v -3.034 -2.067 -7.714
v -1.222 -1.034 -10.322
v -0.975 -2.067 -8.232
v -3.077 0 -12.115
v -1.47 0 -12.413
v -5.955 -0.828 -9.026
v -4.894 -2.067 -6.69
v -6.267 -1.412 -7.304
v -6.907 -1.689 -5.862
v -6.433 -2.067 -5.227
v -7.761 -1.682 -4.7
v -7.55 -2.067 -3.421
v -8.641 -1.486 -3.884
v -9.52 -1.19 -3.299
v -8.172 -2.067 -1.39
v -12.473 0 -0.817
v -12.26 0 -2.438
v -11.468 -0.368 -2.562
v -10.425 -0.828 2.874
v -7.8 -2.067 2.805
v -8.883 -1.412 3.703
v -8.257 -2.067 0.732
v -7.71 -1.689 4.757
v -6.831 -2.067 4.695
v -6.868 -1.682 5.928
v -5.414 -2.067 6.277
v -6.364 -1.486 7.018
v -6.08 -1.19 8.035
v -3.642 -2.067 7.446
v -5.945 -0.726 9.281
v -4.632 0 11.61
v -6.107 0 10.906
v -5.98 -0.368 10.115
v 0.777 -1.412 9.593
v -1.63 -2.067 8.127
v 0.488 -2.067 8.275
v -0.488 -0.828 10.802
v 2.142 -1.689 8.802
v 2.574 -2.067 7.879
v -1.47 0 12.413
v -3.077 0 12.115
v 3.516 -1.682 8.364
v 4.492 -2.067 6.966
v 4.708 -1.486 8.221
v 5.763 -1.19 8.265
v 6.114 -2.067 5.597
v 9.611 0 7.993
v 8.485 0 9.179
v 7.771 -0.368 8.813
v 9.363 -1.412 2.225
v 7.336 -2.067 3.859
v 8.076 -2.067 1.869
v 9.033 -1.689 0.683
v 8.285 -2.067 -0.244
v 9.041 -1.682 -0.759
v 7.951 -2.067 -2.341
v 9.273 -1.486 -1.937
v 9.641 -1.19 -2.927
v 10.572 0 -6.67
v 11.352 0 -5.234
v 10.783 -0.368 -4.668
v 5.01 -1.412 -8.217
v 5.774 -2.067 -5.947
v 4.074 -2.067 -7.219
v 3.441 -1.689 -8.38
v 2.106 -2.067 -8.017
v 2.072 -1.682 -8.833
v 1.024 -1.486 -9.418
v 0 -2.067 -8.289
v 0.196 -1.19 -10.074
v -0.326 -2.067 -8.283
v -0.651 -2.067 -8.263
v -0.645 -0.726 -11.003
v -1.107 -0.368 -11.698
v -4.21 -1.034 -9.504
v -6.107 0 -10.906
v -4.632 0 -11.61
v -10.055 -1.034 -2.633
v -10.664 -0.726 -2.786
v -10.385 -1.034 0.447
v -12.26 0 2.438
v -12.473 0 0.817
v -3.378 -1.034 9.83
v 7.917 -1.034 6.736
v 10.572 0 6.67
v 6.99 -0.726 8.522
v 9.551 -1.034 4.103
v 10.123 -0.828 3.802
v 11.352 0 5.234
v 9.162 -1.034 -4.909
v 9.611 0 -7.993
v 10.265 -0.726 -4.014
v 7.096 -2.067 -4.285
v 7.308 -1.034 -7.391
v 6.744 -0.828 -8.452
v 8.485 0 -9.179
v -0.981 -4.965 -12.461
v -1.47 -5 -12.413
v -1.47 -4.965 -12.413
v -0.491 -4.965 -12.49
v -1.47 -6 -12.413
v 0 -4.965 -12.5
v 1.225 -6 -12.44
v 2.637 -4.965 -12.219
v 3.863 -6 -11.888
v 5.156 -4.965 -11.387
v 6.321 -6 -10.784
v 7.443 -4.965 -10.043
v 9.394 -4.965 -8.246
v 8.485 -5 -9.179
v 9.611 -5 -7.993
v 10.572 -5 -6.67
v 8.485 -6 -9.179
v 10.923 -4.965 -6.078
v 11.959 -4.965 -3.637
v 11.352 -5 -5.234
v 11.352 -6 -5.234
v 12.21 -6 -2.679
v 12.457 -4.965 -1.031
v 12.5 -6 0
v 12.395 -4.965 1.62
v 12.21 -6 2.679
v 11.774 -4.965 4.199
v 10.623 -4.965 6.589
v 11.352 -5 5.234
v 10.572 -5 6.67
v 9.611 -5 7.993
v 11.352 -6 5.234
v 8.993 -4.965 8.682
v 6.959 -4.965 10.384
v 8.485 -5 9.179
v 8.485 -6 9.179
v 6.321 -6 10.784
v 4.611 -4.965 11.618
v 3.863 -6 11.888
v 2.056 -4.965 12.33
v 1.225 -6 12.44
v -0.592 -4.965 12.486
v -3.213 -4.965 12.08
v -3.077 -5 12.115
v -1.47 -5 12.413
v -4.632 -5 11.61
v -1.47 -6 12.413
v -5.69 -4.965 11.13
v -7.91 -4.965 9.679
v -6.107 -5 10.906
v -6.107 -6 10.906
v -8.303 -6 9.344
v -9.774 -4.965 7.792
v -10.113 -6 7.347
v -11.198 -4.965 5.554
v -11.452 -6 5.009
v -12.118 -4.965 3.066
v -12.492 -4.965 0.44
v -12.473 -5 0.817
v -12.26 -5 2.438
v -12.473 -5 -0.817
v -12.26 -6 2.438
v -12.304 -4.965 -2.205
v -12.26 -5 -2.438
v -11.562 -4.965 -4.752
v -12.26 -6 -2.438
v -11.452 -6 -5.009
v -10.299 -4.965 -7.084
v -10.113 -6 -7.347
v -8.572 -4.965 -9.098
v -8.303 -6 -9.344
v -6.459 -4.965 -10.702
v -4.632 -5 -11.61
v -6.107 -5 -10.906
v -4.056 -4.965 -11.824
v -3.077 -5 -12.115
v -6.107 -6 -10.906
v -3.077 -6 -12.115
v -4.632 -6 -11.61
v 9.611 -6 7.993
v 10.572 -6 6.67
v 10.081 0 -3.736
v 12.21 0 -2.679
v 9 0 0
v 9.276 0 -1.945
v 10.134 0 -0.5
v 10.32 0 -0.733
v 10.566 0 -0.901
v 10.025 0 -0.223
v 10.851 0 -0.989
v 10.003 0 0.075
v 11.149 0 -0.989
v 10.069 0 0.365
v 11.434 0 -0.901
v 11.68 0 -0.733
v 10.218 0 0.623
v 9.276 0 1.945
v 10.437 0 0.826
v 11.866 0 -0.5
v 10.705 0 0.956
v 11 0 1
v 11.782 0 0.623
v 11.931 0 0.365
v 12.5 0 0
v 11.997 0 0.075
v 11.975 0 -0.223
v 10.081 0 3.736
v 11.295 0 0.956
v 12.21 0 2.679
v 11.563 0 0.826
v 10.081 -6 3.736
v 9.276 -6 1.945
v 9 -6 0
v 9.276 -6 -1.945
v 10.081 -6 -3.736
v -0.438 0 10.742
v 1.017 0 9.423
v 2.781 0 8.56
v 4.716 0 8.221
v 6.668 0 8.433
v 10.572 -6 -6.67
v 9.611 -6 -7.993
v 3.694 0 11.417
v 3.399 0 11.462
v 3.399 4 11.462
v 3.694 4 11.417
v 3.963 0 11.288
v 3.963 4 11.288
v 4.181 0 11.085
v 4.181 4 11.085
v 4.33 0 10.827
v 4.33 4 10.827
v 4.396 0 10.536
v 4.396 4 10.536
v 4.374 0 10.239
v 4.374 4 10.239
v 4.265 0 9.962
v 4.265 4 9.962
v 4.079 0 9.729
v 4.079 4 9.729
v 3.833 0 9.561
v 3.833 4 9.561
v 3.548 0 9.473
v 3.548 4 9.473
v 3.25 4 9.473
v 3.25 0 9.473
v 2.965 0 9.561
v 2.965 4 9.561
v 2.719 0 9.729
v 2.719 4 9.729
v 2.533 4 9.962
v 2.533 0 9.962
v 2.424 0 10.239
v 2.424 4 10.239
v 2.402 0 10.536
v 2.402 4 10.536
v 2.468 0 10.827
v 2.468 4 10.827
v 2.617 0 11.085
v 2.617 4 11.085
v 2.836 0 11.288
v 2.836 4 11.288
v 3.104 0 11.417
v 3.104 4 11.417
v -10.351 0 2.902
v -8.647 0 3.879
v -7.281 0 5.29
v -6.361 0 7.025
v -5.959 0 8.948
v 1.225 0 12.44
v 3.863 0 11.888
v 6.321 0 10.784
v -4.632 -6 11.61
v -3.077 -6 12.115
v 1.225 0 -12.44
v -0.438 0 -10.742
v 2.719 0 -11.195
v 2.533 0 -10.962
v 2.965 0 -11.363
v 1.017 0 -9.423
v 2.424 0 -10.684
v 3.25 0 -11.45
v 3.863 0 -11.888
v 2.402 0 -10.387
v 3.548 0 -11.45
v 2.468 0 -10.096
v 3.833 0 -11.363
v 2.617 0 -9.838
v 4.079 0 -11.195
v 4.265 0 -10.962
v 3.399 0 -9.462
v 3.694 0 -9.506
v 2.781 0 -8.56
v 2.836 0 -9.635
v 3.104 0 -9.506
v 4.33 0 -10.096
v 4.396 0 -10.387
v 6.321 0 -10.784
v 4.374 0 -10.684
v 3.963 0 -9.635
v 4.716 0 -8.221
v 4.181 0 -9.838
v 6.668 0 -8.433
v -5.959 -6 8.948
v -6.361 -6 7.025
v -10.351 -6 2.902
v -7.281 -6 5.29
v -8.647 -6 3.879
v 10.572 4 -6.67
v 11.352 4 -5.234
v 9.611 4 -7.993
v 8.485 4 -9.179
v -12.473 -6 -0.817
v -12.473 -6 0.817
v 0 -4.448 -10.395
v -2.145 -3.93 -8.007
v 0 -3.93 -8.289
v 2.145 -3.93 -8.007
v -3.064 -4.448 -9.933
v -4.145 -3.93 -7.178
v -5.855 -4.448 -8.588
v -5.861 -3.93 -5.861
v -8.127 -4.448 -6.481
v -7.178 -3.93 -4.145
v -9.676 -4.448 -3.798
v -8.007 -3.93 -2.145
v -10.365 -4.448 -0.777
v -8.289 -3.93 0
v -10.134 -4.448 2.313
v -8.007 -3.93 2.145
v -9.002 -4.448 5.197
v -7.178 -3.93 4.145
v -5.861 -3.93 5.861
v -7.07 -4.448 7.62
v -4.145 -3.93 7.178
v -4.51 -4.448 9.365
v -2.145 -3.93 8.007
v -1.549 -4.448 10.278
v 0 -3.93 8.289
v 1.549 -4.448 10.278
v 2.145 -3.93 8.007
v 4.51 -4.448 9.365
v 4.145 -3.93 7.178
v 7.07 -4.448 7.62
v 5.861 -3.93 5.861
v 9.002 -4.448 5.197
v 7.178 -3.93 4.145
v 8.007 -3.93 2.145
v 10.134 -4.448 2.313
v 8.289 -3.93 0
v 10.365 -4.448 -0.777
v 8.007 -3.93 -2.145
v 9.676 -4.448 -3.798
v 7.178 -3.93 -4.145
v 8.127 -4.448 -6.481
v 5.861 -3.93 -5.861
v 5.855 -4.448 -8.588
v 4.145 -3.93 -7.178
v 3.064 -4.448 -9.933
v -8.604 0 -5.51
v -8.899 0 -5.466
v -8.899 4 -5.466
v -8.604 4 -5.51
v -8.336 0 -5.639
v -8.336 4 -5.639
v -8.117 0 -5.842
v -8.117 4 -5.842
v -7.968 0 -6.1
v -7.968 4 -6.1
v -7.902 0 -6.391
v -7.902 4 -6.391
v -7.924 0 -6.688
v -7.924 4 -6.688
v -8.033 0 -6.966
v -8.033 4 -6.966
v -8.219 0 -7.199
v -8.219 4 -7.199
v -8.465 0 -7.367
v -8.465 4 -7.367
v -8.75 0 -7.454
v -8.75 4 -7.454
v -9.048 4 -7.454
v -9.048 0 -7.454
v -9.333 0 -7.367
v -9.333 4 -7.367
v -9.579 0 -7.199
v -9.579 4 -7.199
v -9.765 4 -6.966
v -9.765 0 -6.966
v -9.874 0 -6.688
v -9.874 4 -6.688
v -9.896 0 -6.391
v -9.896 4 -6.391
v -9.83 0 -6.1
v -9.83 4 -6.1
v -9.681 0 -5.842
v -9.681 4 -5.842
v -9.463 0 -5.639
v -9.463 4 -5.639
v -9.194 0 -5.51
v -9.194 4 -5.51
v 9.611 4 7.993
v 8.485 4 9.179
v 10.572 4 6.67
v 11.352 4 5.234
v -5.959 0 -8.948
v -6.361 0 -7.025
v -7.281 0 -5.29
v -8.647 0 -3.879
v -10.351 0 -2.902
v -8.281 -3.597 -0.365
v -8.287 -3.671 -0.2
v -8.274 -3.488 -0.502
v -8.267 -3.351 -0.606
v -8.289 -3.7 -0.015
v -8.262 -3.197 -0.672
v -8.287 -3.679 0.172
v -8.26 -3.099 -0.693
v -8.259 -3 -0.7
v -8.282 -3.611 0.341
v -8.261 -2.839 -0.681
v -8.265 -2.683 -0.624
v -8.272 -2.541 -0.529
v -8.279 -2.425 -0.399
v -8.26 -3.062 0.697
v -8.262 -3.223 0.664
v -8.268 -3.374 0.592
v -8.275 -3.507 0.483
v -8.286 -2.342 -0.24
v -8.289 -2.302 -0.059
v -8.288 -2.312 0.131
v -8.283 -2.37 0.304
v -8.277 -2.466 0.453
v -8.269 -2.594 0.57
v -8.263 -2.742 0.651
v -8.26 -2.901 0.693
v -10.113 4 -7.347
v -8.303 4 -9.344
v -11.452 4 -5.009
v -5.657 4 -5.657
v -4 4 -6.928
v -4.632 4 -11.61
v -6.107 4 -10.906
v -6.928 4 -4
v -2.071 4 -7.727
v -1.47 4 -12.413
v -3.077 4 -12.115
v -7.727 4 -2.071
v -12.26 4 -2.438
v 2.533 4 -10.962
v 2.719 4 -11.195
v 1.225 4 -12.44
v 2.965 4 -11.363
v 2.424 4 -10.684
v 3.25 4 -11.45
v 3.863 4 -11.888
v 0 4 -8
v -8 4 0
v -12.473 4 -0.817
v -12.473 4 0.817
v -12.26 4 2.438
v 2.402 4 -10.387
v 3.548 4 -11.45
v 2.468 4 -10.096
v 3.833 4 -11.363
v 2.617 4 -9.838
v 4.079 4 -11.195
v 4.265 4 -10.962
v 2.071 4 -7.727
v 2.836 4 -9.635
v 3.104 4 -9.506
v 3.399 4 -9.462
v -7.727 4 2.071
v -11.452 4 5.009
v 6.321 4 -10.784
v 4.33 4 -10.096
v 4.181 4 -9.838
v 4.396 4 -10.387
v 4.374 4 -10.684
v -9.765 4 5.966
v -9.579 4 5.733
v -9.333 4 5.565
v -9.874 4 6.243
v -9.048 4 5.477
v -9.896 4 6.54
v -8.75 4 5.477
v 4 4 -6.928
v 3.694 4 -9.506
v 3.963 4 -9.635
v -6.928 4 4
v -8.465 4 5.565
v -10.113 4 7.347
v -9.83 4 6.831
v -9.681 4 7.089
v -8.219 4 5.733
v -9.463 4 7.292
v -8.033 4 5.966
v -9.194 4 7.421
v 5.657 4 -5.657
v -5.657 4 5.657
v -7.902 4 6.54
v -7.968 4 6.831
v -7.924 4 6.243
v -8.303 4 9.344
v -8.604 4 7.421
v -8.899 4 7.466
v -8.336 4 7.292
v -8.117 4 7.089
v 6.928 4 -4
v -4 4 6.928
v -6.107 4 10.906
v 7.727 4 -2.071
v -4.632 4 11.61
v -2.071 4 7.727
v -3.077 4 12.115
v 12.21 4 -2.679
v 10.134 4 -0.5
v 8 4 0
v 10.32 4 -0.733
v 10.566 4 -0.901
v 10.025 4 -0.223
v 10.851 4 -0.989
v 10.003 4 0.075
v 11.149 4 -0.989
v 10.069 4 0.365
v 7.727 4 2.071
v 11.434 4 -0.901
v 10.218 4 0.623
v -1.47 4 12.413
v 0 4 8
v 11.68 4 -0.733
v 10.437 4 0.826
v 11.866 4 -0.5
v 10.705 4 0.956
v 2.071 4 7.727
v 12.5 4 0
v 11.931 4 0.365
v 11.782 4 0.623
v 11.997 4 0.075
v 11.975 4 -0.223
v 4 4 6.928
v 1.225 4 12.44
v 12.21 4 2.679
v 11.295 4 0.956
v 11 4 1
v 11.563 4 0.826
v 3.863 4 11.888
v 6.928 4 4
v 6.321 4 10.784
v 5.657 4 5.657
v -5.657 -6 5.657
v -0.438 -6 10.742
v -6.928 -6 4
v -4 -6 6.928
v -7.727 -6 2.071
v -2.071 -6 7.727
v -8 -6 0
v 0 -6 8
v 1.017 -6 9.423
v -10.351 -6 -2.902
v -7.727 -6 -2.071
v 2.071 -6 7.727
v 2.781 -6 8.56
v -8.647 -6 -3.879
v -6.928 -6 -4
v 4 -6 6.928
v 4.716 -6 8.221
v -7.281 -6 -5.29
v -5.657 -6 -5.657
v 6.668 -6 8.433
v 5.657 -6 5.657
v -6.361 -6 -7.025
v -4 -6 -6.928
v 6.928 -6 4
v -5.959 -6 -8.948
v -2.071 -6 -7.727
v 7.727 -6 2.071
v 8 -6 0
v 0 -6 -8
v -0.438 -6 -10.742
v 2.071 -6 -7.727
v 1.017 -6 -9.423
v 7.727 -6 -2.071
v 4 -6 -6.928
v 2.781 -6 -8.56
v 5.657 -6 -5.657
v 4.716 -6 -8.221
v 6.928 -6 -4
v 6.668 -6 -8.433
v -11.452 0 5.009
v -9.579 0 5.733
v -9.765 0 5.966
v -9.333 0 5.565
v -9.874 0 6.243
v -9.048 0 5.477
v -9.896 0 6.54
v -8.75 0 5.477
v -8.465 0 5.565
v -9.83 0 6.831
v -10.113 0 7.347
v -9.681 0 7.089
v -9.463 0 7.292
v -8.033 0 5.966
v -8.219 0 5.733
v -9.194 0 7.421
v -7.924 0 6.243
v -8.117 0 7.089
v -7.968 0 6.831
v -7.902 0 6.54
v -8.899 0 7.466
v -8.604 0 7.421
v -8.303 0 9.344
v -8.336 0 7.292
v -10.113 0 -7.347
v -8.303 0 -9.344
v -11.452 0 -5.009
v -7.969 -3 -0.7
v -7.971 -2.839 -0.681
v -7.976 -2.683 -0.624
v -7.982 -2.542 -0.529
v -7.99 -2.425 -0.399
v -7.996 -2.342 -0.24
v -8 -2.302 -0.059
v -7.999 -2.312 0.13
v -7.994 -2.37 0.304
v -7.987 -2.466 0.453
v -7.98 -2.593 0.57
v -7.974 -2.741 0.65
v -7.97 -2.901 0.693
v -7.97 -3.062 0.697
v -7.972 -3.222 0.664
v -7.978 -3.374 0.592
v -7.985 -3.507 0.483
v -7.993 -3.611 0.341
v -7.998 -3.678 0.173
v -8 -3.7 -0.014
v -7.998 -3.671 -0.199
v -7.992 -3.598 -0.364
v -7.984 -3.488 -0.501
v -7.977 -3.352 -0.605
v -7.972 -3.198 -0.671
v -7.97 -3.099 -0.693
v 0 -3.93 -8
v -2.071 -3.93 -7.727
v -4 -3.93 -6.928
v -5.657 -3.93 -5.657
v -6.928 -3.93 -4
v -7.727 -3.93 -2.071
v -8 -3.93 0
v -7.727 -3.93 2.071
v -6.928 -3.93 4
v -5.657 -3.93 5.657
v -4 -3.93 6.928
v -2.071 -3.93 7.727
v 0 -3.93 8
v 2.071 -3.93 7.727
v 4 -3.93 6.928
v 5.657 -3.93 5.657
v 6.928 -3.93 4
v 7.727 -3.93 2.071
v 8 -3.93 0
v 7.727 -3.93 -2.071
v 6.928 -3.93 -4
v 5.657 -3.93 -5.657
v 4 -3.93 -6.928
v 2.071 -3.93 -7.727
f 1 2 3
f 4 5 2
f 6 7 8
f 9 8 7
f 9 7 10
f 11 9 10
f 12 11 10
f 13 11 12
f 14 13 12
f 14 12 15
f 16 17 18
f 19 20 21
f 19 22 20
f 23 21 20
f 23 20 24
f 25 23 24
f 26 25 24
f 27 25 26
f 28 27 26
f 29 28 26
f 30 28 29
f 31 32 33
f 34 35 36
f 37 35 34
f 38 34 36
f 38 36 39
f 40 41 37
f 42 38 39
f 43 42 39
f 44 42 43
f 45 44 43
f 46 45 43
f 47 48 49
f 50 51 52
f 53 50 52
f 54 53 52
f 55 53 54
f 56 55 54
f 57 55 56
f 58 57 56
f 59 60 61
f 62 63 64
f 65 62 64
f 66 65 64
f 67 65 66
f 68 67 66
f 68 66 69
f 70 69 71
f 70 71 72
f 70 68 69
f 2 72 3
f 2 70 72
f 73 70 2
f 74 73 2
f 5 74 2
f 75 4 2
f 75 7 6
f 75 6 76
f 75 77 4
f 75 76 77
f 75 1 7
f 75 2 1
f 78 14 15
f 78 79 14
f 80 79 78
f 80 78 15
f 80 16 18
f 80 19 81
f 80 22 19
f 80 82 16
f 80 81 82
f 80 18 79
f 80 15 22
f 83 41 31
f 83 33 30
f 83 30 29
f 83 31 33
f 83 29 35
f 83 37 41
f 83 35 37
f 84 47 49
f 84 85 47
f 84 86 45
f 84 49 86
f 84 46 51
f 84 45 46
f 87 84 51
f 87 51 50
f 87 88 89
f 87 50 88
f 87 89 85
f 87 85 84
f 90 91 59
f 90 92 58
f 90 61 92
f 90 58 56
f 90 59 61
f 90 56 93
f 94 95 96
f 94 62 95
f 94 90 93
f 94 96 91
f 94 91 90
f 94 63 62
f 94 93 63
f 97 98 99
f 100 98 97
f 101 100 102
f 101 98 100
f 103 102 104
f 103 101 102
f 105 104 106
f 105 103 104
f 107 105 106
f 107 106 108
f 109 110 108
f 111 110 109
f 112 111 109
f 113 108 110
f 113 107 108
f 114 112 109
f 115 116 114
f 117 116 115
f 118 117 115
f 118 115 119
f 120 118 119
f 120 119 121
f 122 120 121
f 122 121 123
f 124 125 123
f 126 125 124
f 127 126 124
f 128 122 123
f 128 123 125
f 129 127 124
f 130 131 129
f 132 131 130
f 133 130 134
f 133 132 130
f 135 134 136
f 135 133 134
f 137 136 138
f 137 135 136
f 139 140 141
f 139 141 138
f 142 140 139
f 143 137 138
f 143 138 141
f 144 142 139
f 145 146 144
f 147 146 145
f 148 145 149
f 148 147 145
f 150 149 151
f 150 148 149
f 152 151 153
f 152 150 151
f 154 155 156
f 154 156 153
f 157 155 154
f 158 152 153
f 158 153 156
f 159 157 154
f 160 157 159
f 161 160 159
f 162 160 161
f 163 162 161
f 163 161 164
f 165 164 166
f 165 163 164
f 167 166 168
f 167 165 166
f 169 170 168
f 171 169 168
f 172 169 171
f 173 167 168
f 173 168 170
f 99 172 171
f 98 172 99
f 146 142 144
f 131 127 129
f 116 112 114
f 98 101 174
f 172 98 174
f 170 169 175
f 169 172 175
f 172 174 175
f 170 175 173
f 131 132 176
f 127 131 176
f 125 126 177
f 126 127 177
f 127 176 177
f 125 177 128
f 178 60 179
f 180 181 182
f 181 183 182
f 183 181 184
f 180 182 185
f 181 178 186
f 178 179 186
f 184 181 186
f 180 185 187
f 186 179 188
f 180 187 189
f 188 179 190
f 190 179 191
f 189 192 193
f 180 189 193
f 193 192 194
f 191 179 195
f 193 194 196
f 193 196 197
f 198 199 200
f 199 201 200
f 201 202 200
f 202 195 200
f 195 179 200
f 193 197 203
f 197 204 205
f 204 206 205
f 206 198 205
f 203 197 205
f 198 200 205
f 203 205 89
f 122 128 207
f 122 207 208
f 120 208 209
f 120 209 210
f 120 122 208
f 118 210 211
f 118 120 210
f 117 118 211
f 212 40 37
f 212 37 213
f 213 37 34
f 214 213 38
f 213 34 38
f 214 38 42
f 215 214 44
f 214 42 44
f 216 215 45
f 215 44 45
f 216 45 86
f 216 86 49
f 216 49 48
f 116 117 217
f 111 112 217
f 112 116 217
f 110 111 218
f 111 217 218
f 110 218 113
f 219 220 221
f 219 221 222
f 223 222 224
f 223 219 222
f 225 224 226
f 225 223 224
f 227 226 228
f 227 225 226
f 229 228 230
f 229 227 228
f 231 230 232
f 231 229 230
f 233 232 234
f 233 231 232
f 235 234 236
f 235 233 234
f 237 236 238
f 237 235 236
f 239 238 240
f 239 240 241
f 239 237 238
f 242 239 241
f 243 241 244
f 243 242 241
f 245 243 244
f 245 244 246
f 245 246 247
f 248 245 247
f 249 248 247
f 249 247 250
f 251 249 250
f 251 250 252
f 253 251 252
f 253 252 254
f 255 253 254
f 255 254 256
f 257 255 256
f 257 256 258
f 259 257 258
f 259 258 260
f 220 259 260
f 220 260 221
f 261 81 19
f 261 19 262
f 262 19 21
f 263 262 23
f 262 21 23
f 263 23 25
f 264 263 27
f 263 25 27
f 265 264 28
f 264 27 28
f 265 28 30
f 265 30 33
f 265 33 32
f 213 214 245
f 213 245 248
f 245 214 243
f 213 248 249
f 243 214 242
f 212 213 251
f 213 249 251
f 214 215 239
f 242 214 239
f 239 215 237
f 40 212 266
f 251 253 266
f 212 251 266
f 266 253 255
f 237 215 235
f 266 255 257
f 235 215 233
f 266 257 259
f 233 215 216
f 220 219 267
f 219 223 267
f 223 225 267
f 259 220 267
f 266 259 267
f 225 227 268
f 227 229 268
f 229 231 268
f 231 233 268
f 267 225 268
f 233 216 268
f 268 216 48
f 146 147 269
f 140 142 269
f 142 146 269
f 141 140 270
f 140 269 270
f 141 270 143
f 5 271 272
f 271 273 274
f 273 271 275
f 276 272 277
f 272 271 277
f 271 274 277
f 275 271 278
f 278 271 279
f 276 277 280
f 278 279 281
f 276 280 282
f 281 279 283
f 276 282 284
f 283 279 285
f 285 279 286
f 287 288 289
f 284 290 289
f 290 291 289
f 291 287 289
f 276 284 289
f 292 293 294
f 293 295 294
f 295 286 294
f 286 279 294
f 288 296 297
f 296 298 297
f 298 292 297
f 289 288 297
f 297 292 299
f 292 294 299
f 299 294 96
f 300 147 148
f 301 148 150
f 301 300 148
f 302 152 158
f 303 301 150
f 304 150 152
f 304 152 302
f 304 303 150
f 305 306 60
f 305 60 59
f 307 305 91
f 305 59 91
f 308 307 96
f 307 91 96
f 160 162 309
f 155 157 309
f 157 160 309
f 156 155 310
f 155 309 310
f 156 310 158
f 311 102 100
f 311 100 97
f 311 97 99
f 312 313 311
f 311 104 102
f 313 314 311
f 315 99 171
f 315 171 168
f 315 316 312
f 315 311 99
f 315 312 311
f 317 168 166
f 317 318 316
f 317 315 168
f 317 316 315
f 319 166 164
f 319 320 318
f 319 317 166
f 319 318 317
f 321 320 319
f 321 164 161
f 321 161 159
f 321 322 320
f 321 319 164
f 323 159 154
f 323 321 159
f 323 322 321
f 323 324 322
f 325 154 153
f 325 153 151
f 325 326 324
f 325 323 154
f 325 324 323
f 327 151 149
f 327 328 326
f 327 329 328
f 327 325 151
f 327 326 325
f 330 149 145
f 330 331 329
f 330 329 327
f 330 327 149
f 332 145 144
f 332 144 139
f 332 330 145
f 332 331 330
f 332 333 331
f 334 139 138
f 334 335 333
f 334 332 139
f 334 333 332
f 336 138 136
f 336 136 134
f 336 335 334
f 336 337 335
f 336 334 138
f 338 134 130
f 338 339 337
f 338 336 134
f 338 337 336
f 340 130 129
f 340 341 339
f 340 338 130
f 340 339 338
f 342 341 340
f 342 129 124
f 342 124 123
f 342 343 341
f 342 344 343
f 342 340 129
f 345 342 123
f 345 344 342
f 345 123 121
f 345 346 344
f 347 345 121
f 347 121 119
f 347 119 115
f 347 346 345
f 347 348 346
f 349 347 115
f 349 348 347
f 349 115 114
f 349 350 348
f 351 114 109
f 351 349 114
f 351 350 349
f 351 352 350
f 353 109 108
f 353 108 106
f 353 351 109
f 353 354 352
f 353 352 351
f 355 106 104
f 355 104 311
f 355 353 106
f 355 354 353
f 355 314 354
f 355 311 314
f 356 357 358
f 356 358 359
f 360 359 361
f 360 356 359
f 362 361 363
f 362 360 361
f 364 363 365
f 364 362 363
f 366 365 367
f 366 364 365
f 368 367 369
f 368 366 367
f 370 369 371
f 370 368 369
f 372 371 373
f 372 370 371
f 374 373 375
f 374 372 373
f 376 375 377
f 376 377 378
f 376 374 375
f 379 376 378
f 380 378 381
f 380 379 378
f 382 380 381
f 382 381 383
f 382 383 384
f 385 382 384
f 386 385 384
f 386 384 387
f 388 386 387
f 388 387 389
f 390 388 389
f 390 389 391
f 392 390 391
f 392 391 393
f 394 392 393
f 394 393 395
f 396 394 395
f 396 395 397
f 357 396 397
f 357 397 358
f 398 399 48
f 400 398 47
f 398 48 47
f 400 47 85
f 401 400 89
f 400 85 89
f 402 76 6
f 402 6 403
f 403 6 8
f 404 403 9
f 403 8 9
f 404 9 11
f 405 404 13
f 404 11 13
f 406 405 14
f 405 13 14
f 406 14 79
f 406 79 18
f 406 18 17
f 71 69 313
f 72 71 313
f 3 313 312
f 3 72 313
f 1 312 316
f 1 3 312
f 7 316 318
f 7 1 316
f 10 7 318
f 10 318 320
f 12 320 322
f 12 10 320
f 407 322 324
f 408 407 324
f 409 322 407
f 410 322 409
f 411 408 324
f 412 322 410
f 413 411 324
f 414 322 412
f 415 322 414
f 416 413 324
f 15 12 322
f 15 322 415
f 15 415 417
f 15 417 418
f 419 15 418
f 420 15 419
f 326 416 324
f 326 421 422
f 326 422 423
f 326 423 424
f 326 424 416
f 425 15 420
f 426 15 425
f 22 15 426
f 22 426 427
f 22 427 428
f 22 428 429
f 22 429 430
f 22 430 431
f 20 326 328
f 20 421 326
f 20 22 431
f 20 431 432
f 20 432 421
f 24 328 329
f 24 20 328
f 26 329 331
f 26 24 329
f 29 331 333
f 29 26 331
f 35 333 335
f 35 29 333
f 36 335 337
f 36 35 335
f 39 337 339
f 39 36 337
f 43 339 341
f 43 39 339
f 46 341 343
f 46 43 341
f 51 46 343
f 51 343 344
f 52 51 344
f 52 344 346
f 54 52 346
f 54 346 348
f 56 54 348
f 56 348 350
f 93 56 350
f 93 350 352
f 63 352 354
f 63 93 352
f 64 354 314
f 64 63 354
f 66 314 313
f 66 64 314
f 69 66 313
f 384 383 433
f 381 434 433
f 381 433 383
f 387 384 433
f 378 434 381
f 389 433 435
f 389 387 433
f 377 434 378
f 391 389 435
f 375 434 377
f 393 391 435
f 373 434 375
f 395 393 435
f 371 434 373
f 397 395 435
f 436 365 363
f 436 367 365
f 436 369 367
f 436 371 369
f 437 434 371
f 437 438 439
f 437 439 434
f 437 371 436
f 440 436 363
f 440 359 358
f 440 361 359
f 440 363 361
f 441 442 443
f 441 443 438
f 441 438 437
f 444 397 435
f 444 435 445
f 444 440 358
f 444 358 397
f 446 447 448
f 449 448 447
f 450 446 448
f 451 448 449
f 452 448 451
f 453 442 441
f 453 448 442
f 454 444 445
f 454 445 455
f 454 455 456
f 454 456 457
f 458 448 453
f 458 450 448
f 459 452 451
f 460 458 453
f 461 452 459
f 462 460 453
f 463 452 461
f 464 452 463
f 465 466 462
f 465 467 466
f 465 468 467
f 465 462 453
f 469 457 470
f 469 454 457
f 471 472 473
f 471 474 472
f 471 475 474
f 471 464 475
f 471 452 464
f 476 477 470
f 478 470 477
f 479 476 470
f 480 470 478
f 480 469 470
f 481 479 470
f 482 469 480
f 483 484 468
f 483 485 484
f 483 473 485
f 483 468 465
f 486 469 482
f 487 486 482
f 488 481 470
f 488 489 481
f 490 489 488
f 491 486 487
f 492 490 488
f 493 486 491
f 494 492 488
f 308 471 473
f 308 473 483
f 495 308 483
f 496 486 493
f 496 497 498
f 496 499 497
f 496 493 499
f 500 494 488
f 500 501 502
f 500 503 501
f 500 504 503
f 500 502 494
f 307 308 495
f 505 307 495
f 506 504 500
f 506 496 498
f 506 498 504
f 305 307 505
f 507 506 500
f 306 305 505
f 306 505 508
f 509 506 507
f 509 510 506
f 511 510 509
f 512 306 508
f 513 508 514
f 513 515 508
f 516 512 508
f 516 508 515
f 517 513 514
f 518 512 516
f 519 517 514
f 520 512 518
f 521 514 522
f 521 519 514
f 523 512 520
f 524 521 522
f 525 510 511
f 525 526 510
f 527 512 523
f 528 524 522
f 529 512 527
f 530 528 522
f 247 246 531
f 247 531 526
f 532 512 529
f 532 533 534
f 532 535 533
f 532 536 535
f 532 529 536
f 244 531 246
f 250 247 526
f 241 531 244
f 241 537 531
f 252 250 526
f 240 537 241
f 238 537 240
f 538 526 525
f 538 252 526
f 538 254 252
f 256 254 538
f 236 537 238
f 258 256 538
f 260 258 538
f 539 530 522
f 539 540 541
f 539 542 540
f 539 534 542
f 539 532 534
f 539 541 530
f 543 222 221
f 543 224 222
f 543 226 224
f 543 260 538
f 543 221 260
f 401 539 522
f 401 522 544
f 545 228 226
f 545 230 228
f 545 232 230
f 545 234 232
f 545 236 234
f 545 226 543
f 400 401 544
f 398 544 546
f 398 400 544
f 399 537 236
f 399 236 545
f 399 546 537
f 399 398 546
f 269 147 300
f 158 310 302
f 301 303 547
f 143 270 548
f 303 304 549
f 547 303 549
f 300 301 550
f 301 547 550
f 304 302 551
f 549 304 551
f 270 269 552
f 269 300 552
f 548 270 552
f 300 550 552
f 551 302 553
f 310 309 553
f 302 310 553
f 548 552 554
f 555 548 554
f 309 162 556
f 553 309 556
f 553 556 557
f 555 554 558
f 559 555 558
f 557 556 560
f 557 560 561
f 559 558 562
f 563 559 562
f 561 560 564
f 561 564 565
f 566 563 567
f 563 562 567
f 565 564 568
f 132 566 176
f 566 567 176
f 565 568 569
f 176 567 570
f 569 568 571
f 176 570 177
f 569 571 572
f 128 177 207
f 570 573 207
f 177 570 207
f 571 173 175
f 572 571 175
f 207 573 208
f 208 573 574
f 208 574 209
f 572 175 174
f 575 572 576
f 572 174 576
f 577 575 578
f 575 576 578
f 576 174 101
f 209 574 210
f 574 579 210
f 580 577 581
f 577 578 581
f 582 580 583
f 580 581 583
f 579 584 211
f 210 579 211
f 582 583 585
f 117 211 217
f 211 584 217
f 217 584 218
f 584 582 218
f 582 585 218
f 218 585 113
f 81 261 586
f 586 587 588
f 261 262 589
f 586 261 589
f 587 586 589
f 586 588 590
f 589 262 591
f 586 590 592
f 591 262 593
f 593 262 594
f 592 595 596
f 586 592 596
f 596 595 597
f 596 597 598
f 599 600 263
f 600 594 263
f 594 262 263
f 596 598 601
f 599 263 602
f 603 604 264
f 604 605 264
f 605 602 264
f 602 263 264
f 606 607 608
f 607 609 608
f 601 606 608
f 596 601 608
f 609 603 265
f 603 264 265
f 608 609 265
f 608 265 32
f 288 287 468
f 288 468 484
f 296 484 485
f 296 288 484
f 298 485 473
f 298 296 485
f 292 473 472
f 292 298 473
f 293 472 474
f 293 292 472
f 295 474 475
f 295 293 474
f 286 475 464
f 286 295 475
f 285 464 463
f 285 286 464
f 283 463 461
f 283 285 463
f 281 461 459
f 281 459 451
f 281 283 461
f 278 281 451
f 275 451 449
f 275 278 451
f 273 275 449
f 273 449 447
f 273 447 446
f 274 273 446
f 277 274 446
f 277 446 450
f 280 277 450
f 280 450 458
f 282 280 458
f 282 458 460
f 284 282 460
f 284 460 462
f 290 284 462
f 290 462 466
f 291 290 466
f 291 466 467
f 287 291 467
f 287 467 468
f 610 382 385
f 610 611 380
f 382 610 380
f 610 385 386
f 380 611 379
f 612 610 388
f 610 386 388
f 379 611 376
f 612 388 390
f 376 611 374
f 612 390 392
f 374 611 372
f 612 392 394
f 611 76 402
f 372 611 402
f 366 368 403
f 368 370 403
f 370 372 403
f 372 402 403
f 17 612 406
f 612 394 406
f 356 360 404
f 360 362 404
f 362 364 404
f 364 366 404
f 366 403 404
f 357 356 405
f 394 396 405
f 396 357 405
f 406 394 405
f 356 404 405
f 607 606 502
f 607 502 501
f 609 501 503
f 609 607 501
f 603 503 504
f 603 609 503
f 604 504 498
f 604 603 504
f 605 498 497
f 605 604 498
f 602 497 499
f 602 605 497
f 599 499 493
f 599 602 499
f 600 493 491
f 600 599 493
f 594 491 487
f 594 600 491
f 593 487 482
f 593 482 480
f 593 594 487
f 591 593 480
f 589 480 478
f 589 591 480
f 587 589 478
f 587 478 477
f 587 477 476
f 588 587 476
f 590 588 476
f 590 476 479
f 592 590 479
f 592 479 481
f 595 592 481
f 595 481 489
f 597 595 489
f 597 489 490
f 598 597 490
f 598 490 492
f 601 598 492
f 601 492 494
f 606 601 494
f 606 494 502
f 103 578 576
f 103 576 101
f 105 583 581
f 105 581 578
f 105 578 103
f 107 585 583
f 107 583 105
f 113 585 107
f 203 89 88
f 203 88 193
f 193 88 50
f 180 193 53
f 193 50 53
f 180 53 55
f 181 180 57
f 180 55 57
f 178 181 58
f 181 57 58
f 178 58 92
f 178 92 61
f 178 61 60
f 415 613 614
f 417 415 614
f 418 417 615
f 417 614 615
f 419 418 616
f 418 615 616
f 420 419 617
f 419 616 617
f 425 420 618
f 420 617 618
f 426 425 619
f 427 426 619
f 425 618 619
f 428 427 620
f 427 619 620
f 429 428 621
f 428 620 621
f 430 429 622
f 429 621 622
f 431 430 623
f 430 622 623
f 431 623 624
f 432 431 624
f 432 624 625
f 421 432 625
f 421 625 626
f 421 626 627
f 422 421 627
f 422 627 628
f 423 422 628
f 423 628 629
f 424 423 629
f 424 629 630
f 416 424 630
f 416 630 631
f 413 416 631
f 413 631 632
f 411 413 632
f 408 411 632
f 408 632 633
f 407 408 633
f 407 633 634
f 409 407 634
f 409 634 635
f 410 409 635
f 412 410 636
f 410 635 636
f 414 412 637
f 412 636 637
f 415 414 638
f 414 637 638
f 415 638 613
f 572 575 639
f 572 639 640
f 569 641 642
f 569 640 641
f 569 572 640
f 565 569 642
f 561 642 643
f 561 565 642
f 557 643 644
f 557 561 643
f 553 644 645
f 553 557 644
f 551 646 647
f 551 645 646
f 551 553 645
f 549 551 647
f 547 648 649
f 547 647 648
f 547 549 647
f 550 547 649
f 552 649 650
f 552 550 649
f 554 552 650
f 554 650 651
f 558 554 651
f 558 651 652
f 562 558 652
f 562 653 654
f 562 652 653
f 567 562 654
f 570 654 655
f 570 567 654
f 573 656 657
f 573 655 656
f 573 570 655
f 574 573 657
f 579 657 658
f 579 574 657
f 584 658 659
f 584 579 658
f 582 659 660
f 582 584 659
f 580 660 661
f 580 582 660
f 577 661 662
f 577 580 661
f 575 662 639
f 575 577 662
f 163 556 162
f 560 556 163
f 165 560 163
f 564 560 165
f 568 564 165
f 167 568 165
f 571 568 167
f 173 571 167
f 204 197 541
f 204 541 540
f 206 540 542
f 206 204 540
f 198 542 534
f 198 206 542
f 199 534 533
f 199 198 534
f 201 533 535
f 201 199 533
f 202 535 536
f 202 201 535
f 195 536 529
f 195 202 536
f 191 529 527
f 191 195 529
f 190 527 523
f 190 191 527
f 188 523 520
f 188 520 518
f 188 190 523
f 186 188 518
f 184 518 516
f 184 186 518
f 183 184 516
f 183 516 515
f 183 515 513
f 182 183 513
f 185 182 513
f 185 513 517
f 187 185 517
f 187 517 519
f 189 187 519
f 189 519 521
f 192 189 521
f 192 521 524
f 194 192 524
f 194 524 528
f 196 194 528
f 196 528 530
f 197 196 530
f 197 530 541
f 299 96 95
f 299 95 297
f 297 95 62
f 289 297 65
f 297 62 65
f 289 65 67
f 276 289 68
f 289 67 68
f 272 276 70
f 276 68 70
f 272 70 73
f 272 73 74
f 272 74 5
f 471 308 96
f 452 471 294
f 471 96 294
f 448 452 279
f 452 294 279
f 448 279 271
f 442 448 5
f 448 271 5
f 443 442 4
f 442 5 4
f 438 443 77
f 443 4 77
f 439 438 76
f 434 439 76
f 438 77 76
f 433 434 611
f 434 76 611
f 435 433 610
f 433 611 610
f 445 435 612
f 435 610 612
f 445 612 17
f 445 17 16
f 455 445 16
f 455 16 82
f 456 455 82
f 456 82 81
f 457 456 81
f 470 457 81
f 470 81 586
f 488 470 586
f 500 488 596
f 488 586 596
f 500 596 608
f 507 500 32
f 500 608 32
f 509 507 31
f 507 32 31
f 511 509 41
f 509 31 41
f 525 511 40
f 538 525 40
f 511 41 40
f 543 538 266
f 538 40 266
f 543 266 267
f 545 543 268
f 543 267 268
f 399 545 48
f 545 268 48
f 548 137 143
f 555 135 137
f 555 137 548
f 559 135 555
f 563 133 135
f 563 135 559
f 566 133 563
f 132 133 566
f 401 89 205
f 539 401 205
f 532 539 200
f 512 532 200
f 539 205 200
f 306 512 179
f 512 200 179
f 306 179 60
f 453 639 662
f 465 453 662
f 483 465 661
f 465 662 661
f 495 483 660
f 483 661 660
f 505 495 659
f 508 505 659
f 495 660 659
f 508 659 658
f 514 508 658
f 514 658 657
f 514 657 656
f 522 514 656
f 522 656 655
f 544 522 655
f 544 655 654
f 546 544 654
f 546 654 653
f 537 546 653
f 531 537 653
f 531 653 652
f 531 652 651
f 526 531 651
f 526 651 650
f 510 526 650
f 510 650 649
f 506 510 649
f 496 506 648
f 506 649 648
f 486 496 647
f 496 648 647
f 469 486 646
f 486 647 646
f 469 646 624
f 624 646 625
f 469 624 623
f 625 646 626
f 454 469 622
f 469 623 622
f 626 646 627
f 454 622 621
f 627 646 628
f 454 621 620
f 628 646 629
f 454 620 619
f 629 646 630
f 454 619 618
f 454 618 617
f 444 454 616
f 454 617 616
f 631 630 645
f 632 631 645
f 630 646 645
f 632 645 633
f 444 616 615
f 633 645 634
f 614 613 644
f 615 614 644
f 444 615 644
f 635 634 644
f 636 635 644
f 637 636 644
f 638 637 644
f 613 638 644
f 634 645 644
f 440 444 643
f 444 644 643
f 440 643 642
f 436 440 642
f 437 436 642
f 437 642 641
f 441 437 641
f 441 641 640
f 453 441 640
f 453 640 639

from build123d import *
from build123d.topology import SkipClean

# Parameters (mm, degrees)
SKETCH_1_R          = 12.5
EXTRUDE_1_DEPTH     = 4
SKETCH_2_R          = 1
EXTRUDE_2_DEPTH     = 7.5
SKETCH_5_R          = 6
CUT_EXTRUDE_1_DEPTH = 10
CUT_EXTRUDE_START   = -7.5
SKETCH_7_R          = 1
CUT_EXTRUDE_2_DEPTH = 7.5
SKETCH_8_R          = 12.5
SKETCH_8_R_2        = 6
CUT_EXTRUDE_3_DEPTH = 10
SKETCH_9_R          = 1
EXTRUDE_3_DEPTH     = 10
CUT_EXTRUDE_START_2 = -14
SKETCH_10_R         = 1
CUT_EXTRUDE_4_DEPTH = 14
SKETCH_11_R         = 8
CUT_EXTRUDE_5_DEPTH = 10
EXTRUDE_START       = -10
SKETCH_12_R         = 8
EXTRUDE_4_DEPTH     = 10
SKETCH_14_R         = 8
CUT_EXTRUDE_6_DEPTH = 10
SKETCH_15_W         = 0.086708075
SKETCH_15_H         = 4
SKETCH_16_R         = 0.7
CUT_EXTRUDE_7_DEPTH = 10
SKETCH_18_R         = 12.5
EXTRUDE_5_DEPTH     = 2.07
CUT_EXTRUDE_START_3 = -2.07
SKETCH_20_R         = 8
CUT_EXTRUDE_8_DEPTH = 2.07


with BuildPart() as part:
    # 草图1 → 凸台-拉伸1 (new body)
    with BuildSketch(Plane(origin=(0, 0, 0), x_dir=(1, 0, 0), z_dir=(0, 1, 0))):
        with Locations(Location((0, 0, 0), (0, 0, 270))):
            Circle(SKETCH_1_R)
    extrude(amount=EXTRUDE_1_DEPTH)

    # 草图2 → 凸台-拉伸2 (add)
    with BuildSketch(Plane(origin=(0, 4, 0), x_dir=(1, 0, 0), z_dir=(0, 1, 0))):
        with Locations(Location((10, 0, 0), (0, 0, 270))):
            Circle(SKETCH_2_R)
        with Locations(Location((3.399186938, -10.461621679, 0), (0, 0, 270))):
            Circle(SKETCH_2_R)
        with Locations(Location((-8.590169944, -7.416694292, 0), (0, 0, 270))):
            Circle(SKETCH_2_R)
        with Locations(Location((-9.399186938, 4.926796007, 0), (0, 0, 270))):
            Circle(SKETCH_2_R)
        with Locations(Location((2.090169944, 9.510565163, 0), (0, 0, 270))):
            Circle(SKETCH_2_R)
    extrude(amount=EXTRUDE_2_DEPTH)

    # 草图5 → 切除-拉伸1 (cut)
    with BuildSketch(Plane(origin=(0, 4, 0), x_dir=(1, 0, 0), z_dir=(0, 1, 0))):
        with Locations(Location((0, 0, 0), (0, 0, 270))):
            Circle(SKETCH_5_R)
    extrude(amount=-CUT_EXTRUDE_1_DEPTH, mode=Mode.SUBTRACT)

    # 草图7 → 切除-拉伸2 (cut)
    with BuildSketch(Plane(origin=(0, 11.5, 0), x_dir=(1, 0, 0), z_dir=(0, 1, 0)).offset(CUT_EXTRUDE_START)):
        with Locations((-9.399186938, 4.926796007)):
            Circle(SKETCH_7_R)
    extrude(amount=CUT_EXTRUDE_2_DEPTH, mode=Mode.SUBTRACT)

    # 草图8 → 切除-拉伸3 (cut)
    with BuildSketch(Plane(origin=(0, 4, 0), x_dir=(1, 0, 0), z_dir=(0, 1, 0))):
        with Locations(Location((0, 0, 0), (0, 0, 270))):
            Circle(SKETCH_8_R)
        with Locations(Location((0, 0, 0), (0, 0, 270))):
            Circle(SKETCH_8_R_2, mode=Mode.SUBTRACT)
    extrude(amount=CUT_EXTRUDE_3_DEPTH, mode=Mode.SUBTRACT)

    # 草图9 → 凸台-拉伸3 (add)
    with BuildSketch(Plane(origin=(0, 4, 0), x_dir=(1, 0, 0), z_dir=(0, 1, 0))):
        with Locations(Location((11, 0, 0), (0, 0, 270))):
            Circle(SKETCH_9_R)
        with Locations(Location((3.399186938, -10.461621679, 0), (0, 0, 270))):
            Circle(SKETCH_9_R)
        with Locations(Location((-8.899186938, -6.465637775, 0), (0, 0, 270))):
            Circle(SKETCH_9_R)
        with Locations(Location((-8.899186938, 6.465637775, 0), (0, 0, 270))):
            Circle(SKETCH_9_R)
        with Locations(Location((3.399186938, 10.461621679, 0), (0, 0, 270))):
            Circle(SKETCH_9_R)
    extrude(amount=EXTRUDE_3_DEPTH)

    # 草图10 → 切除-拉伸4 (cut)
    with BuildSketch(Plane(origin=(0, 14, 0), x_dir=(1, 0, 0), z_dir=(0, 1, 0)).offset(CUT_EXTRUDE_START_2)):
        with Locations(Location((-8.899186938, -6.465637775, 0), (0, 0, 270))):
            Circle(SKETCH_10_R)
        with Locations(Location((3.399186938, -10.461621679, 0), (0, 0, 270))):
            Circle(SKETCH_10_R)
        with Locations(Location((11, 0, 0), (0, 0, 270))):
            Circle(SKETCH_10_R)
        with Locations(Location((3.399186938, 10.461621679, 0), (0, 0, 270))):
            Circle(SKETCH_10_R)
        with Locations(Location((-8.899186938, 6.465637775, 0), (0, 0, 270))):
            Circle(SKETCH_10_R)
    extrude(amount=CUT_EXTRUDE_4_DEPTH, mode=Mode.SUBTRACT)

    # 草图11 → 切除-拉伸5 (cut)
    with BuildSketch(Plane(origin=(0, 4, 0), x_dir=(1, 0, 0), z_dir=(0, 1, 0))):
        with Locations(Location((0, 0, 0), (0, 0, 270))):
            Circle(SKETCH_11_R)
    extrude(amount=-CUT_EXTRUDE_5_DEPTH, mode=Mode.SUBTRACT)

    # 草图12 → 凸台-拉伸4 (add)
    # profile 1 of 2: a face of its own
    with BuildSketch(Plane(origin=(0, 4, 0), x_dir=(1, 0, 0), z_dir=(0, 1, 0)).offset(EXTRUDE_START)):
        with BuildLine():
            ThreePointArc((8.48540775, 9.178663046), (2.781152949, 8.559508647), (-1.469756299, 12.413291925))
            ThreePointArc((-1.469756299, 12.413291925), (-3.86271243, 11.888206454), (-6.107292102, 10.906465201))
            ThreePointArc((-6.107292102, 10.906465201), (-7.281152949, 5.290067271), (-12.259921848, 2.438096855))
            ThreePointArc((-12.259921848, 2.438096855), (-12.5, 0), (-12.259921848, -2.438096855))
            ThreePointArc((-12.259921848, -2.438096855), (-7.281152949, -5.290067271), (-6.107292102, -10.906465201))
            ThreePointArc((-6.107292102, -10.906465201), (-3.86271243, -11.888206454), (-1.469756299, -12.413291925))
            ThreePointArc((-1.469756299, -12.413291925), (2.781152949, -8.559508647), (8.48540775, -9.178663046))
            ThreePointArc((8.48540775, -9.178663046), (10.11271243, -7.347315654), (11.3515625, -5.233739467))
            ThreePointArc((11.3515625, -5.233739467), (9, 0), (11.3515625, 5.233739467))
            ThreePointArc((11.3515625, 5.233739467), (10.11271243, 7.347315654), (8.48540775, 9.178663046))
        make_face()
        Circle(SKETCH_12_R, mode=Mode.SUBTRACT)
    # profile 2 of 2: a face of its own
    with BuildSketch(Plane(origin=(0, 4, 0), x_dir=(1, 0, 0), z_dir=(0, 1, 0)).offset(EXTRUDE_START)):
        Circle(SKETCH_12_R)
    extrude(amount=EXTRUDE_4_DEPTH)

    # 草图14 → 切除-拉伸6 (cut)
    with SkipClean():  # the faces are left unmerged after this step: merging them gives an invalid solid
        with BuildSketch(Plane.XZ.offset(6)):
            with Locations(Location((0, 0, 0), (0, 0, 270))):
                Circle(SKETCH_14_R)
        extrude(amount=-CUT_EXTRUDE_6_DEPTH, mode=Mode.SUBTRACT)
    add(part.part.scale(1), mode=Mode.REPLACE)  # the faces are merged on a copy

    # 草图15 → 切除-旋转2 (revolve, cut)
    with BuildSketch(Plane(origin=(0, 0, 0), x_dir=(0, 0, -1), z_dir=(1, 0, 0)), mode=Mode.PRIVATE) as cut_revolve_2_sk:
        with Locations((12.456645963, -3)):
            Rectangle(SKETCH_15_W, SKETCH_15_H)
        Polygon((12.413291925, -1), (12.413291925, -5), (9.178663046, -3.93256933), (9.178663046, -2.06743067), align=None)
    revolve(cut_revolve_2_sk.sketch.rotate(Axis((0, 0, 0), (0, -1, 0)), 353.247512934), axis=Axis((0, 0, 0), (0, -1, 0)), mode=Mode.SUBTRACT)

    # 草图16 → 切除-拉伸7 (cut)
    with BuildSketch(Plane(origin=(0, 0, 0), x_dir=(0, 0, -1), z_dir=(1, 0, 0))):
        with Locations((0, -3)):
            Circle(SKETCH_16_R)
    extrude(amount=-CUT_EXTRUDE_7_DEPTH, mode=Mode.SUBTRACT)

    # 草图17 → 切除-旋转4 (revolve, cut)
    with BuildSketch(Plane(origin=(0, 0, 0), x_dir=(0, 0, -1), z_dir=(1, 0, 0)), mode=Mode.PRIVATE) as cut_revolve_4_sk:
        Polygon((12.5, -1), (9.265914401, -2.06743067), (8.289016568, -2.06743067), (12.5, 0), align=None)
    revolve(cut_revolve_4_sk.sketch.rotate(Axis((0, 0, 0), (0, 1, 0)), 6.752487066), axis=Axis((0, 0, 0), (0, 1, 0)), mode=Mode.SUBTRACT)

    # 草图18 → 凸台-拉伸5 (add)
    with SkipClean():  # the faces are left unmerged after this step: merging them gives an invalid solid
        with BuildSketch(Plane.XZ.offset(6)):
            with Locations(Location((0, 0, 0), (0, 0, 263.247512934))):
                Circle(SKETCH_18_R)
        extrude(amount=-EXTRUDE_5_DEPTH)

    # 草图19 → 切除-旋转5 (revolve, cut)
    with SkipClean():  # the faces are left unmerged after this step: merging them gives an invalid solid
        with BuildSketch(Plane(origin=(0, 0, 0), x_dir=(0, 0, -1), z_dir=(1, 0, 0))):
            Polygon((12.5, -2.06743067), (12.5, -4.965), (8.289016568, -3.93), (8.289016568, -2.06743067), align=None)
        revolve(axis=Axis((0, 0, 0), (0, 1, 0)), mode=Mode.SUBTRACT)

    # 草图20 → 切除-拉伸8 (cut)
    with SkipClean():  # the faces are left unmerged after this step: merging them gives an invalid solid
        with BuildSketch(Plane(origin=(0, -3.93, 0), x_dir=(1, 0, 0), z_dir=(0, 1, 0)).offset(CUT_EXTRUDE_START_3)):
            with Locations(Location((0, 0, 0), (0, 0, 90))):
                Circle(SKETCH_20_R)
        extrude(amount=CUT_EXTRUDE_8_DEPTH, mode=Mode.SUBTRACT)


solid = part.part
